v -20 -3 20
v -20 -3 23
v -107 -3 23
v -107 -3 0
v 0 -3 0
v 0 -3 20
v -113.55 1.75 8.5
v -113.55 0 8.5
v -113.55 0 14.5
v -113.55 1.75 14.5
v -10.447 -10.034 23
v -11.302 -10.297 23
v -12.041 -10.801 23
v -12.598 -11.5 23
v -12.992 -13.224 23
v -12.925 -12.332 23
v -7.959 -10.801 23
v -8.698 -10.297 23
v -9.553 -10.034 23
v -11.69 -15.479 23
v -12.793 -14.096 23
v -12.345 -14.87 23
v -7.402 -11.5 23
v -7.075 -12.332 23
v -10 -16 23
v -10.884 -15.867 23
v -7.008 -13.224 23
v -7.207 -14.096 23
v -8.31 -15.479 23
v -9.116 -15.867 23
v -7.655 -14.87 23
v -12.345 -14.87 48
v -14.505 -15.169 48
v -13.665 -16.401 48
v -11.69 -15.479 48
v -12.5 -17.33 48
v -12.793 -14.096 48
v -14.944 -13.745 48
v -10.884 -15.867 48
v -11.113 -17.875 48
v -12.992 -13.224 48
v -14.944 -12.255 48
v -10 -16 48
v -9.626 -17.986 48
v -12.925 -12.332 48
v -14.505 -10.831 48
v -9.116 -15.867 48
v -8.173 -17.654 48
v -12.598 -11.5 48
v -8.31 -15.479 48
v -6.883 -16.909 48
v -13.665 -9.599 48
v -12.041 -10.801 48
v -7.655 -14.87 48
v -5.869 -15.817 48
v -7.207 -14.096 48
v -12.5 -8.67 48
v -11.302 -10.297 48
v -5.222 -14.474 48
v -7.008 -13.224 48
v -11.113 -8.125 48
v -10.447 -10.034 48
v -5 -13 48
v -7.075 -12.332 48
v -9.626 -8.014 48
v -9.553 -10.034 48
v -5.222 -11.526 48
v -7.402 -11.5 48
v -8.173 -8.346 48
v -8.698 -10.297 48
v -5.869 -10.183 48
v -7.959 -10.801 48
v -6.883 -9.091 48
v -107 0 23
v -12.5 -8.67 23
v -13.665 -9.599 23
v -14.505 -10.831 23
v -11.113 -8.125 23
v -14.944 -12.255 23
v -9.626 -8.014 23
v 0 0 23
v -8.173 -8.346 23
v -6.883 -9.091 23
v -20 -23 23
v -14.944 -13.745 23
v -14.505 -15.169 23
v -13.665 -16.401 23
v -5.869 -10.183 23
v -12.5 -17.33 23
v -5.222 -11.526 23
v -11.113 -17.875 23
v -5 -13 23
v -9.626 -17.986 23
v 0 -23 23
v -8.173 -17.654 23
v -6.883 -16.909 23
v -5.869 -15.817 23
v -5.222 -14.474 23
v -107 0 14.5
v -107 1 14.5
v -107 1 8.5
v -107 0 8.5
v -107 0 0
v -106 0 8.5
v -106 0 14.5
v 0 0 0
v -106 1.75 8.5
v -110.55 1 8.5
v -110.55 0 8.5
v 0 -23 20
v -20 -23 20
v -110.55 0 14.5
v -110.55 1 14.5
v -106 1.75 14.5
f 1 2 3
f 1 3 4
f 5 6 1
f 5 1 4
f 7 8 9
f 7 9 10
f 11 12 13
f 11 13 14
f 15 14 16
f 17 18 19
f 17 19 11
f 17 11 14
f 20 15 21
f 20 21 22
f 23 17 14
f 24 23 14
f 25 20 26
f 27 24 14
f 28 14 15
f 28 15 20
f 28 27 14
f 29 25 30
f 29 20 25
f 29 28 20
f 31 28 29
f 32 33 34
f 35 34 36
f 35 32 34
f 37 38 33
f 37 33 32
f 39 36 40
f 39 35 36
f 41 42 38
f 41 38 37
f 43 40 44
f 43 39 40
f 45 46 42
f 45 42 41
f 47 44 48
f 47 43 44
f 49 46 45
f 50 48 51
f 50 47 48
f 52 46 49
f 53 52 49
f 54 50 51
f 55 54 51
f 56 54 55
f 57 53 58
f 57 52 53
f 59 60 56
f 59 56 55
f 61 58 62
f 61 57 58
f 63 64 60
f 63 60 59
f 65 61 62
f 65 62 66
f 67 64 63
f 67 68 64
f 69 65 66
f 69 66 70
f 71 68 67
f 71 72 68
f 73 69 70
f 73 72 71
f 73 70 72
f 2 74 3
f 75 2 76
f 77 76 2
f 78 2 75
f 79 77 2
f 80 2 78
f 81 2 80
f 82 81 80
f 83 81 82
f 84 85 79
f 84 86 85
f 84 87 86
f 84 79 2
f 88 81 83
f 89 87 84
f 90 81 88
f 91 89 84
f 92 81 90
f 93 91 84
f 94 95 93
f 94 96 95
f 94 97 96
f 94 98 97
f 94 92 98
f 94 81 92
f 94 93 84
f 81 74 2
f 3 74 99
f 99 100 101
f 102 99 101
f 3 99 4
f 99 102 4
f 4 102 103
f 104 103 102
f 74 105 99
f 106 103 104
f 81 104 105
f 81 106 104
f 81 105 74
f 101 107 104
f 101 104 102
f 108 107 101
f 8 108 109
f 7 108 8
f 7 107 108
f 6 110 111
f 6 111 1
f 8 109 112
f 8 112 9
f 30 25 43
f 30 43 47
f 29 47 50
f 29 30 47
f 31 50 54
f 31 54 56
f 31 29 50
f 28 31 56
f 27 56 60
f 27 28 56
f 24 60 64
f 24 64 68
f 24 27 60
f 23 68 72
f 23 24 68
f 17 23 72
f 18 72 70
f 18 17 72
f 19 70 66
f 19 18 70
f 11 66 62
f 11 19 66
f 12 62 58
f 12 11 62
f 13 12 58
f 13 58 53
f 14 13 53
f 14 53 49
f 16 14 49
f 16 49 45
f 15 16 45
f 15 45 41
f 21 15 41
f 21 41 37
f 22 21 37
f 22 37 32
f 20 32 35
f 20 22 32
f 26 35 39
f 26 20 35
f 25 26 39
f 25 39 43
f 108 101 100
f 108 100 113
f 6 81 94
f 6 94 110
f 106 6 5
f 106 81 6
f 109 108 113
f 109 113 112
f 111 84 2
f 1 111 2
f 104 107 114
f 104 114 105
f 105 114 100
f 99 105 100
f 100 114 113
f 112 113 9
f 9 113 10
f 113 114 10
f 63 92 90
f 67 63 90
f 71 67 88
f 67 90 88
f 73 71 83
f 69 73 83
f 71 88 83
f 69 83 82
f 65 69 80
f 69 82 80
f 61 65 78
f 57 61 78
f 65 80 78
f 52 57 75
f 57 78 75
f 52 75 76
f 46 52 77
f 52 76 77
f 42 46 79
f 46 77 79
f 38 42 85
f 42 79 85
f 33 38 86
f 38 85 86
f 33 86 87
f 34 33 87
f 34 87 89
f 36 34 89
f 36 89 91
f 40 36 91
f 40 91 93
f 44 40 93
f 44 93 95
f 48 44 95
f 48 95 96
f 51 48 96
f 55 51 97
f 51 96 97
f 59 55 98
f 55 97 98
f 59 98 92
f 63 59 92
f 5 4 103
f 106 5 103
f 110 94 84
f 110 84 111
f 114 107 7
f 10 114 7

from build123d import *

# Parameters (mm, degrees)
BOSS_EXTRUDE1_DEPTH      = 107
SKETCH7_W                = 87
SKETCH7_H                = 20
CUT_EXTRUDE4_DEPTH       = 25
SKETCH8_R                = 5
SKETCH8_R_2              = 3
BOSS_EXTRUDE3_DEPTH      = 25
BOSS_EXTRUDE4_DEPTH      = 3
BOSS_EXTRUDE4_DEPTH_BACK = 3
BOSS_EXTRUDE4_START      = 11.5


with BuildPart() as part:
    # Sketch2 → Boss-Extrude1 (new body)
    with BuildSketch(Plane(origin=(0, 0, 0), x_dir=(0, 0, -1), z_dir=(1, 0, 0))):
        Polygon((0, 0), (-23, 0), (-23, -23), (-20, -23), (-20, -3), (0, -3), align=None)
    extrude(amount=-BOSS_EXTRUDE1_DEPTH)

    # Sketch7 → Cut-Extrude4 (cut)
    with BuildSketch(Plane.XY.offset(23)):
        with Locations((-63.5, -13)):
            Rectangle(SKETCH7_W, SKETCH7_H)
    extrude(amount=-CUT_EXTRUDE4_DEPTH, mode=Mode.SUBTRACT)

    # Sketch8 → Boss-Extrude3 (add)
    with BuildSketch(Plane.XY.offset(23)):
        with Locations((-10, -13)):
            Circle(SKETCH8_R)
        with Locations(Location((-10, -13, 0), (0, 0, 270))):
            Circle(SKETCH8_R_2, mode=Mode.SUBTRACT)
    extrude(amount=BOSS_EXTRUDE3_DEPTH)

    # Sketch9 → Boss-Extrude4 (add, two sides: drawn at the far end of the back side and taken through both)
    with BuildSketch(Plane.XY.offset(BOSS_EXTRUDE4_START - BOSS_EXTRUDE4_DEPTH_BACK)):
        Polygon((-107, 0), (-107, 1), (-110.55, 1), (-110.55, 0), (-113.55, 0), (-113.55, 1.75), (-110.55, 1.75), (-106, 1.75), (-106, 0), align=None)
    extrude(amount=BOSS_EXTRUDE4_DEPTH + BOSS_EXTRUDE4_DEPTH_BACK)


solid = part.part
